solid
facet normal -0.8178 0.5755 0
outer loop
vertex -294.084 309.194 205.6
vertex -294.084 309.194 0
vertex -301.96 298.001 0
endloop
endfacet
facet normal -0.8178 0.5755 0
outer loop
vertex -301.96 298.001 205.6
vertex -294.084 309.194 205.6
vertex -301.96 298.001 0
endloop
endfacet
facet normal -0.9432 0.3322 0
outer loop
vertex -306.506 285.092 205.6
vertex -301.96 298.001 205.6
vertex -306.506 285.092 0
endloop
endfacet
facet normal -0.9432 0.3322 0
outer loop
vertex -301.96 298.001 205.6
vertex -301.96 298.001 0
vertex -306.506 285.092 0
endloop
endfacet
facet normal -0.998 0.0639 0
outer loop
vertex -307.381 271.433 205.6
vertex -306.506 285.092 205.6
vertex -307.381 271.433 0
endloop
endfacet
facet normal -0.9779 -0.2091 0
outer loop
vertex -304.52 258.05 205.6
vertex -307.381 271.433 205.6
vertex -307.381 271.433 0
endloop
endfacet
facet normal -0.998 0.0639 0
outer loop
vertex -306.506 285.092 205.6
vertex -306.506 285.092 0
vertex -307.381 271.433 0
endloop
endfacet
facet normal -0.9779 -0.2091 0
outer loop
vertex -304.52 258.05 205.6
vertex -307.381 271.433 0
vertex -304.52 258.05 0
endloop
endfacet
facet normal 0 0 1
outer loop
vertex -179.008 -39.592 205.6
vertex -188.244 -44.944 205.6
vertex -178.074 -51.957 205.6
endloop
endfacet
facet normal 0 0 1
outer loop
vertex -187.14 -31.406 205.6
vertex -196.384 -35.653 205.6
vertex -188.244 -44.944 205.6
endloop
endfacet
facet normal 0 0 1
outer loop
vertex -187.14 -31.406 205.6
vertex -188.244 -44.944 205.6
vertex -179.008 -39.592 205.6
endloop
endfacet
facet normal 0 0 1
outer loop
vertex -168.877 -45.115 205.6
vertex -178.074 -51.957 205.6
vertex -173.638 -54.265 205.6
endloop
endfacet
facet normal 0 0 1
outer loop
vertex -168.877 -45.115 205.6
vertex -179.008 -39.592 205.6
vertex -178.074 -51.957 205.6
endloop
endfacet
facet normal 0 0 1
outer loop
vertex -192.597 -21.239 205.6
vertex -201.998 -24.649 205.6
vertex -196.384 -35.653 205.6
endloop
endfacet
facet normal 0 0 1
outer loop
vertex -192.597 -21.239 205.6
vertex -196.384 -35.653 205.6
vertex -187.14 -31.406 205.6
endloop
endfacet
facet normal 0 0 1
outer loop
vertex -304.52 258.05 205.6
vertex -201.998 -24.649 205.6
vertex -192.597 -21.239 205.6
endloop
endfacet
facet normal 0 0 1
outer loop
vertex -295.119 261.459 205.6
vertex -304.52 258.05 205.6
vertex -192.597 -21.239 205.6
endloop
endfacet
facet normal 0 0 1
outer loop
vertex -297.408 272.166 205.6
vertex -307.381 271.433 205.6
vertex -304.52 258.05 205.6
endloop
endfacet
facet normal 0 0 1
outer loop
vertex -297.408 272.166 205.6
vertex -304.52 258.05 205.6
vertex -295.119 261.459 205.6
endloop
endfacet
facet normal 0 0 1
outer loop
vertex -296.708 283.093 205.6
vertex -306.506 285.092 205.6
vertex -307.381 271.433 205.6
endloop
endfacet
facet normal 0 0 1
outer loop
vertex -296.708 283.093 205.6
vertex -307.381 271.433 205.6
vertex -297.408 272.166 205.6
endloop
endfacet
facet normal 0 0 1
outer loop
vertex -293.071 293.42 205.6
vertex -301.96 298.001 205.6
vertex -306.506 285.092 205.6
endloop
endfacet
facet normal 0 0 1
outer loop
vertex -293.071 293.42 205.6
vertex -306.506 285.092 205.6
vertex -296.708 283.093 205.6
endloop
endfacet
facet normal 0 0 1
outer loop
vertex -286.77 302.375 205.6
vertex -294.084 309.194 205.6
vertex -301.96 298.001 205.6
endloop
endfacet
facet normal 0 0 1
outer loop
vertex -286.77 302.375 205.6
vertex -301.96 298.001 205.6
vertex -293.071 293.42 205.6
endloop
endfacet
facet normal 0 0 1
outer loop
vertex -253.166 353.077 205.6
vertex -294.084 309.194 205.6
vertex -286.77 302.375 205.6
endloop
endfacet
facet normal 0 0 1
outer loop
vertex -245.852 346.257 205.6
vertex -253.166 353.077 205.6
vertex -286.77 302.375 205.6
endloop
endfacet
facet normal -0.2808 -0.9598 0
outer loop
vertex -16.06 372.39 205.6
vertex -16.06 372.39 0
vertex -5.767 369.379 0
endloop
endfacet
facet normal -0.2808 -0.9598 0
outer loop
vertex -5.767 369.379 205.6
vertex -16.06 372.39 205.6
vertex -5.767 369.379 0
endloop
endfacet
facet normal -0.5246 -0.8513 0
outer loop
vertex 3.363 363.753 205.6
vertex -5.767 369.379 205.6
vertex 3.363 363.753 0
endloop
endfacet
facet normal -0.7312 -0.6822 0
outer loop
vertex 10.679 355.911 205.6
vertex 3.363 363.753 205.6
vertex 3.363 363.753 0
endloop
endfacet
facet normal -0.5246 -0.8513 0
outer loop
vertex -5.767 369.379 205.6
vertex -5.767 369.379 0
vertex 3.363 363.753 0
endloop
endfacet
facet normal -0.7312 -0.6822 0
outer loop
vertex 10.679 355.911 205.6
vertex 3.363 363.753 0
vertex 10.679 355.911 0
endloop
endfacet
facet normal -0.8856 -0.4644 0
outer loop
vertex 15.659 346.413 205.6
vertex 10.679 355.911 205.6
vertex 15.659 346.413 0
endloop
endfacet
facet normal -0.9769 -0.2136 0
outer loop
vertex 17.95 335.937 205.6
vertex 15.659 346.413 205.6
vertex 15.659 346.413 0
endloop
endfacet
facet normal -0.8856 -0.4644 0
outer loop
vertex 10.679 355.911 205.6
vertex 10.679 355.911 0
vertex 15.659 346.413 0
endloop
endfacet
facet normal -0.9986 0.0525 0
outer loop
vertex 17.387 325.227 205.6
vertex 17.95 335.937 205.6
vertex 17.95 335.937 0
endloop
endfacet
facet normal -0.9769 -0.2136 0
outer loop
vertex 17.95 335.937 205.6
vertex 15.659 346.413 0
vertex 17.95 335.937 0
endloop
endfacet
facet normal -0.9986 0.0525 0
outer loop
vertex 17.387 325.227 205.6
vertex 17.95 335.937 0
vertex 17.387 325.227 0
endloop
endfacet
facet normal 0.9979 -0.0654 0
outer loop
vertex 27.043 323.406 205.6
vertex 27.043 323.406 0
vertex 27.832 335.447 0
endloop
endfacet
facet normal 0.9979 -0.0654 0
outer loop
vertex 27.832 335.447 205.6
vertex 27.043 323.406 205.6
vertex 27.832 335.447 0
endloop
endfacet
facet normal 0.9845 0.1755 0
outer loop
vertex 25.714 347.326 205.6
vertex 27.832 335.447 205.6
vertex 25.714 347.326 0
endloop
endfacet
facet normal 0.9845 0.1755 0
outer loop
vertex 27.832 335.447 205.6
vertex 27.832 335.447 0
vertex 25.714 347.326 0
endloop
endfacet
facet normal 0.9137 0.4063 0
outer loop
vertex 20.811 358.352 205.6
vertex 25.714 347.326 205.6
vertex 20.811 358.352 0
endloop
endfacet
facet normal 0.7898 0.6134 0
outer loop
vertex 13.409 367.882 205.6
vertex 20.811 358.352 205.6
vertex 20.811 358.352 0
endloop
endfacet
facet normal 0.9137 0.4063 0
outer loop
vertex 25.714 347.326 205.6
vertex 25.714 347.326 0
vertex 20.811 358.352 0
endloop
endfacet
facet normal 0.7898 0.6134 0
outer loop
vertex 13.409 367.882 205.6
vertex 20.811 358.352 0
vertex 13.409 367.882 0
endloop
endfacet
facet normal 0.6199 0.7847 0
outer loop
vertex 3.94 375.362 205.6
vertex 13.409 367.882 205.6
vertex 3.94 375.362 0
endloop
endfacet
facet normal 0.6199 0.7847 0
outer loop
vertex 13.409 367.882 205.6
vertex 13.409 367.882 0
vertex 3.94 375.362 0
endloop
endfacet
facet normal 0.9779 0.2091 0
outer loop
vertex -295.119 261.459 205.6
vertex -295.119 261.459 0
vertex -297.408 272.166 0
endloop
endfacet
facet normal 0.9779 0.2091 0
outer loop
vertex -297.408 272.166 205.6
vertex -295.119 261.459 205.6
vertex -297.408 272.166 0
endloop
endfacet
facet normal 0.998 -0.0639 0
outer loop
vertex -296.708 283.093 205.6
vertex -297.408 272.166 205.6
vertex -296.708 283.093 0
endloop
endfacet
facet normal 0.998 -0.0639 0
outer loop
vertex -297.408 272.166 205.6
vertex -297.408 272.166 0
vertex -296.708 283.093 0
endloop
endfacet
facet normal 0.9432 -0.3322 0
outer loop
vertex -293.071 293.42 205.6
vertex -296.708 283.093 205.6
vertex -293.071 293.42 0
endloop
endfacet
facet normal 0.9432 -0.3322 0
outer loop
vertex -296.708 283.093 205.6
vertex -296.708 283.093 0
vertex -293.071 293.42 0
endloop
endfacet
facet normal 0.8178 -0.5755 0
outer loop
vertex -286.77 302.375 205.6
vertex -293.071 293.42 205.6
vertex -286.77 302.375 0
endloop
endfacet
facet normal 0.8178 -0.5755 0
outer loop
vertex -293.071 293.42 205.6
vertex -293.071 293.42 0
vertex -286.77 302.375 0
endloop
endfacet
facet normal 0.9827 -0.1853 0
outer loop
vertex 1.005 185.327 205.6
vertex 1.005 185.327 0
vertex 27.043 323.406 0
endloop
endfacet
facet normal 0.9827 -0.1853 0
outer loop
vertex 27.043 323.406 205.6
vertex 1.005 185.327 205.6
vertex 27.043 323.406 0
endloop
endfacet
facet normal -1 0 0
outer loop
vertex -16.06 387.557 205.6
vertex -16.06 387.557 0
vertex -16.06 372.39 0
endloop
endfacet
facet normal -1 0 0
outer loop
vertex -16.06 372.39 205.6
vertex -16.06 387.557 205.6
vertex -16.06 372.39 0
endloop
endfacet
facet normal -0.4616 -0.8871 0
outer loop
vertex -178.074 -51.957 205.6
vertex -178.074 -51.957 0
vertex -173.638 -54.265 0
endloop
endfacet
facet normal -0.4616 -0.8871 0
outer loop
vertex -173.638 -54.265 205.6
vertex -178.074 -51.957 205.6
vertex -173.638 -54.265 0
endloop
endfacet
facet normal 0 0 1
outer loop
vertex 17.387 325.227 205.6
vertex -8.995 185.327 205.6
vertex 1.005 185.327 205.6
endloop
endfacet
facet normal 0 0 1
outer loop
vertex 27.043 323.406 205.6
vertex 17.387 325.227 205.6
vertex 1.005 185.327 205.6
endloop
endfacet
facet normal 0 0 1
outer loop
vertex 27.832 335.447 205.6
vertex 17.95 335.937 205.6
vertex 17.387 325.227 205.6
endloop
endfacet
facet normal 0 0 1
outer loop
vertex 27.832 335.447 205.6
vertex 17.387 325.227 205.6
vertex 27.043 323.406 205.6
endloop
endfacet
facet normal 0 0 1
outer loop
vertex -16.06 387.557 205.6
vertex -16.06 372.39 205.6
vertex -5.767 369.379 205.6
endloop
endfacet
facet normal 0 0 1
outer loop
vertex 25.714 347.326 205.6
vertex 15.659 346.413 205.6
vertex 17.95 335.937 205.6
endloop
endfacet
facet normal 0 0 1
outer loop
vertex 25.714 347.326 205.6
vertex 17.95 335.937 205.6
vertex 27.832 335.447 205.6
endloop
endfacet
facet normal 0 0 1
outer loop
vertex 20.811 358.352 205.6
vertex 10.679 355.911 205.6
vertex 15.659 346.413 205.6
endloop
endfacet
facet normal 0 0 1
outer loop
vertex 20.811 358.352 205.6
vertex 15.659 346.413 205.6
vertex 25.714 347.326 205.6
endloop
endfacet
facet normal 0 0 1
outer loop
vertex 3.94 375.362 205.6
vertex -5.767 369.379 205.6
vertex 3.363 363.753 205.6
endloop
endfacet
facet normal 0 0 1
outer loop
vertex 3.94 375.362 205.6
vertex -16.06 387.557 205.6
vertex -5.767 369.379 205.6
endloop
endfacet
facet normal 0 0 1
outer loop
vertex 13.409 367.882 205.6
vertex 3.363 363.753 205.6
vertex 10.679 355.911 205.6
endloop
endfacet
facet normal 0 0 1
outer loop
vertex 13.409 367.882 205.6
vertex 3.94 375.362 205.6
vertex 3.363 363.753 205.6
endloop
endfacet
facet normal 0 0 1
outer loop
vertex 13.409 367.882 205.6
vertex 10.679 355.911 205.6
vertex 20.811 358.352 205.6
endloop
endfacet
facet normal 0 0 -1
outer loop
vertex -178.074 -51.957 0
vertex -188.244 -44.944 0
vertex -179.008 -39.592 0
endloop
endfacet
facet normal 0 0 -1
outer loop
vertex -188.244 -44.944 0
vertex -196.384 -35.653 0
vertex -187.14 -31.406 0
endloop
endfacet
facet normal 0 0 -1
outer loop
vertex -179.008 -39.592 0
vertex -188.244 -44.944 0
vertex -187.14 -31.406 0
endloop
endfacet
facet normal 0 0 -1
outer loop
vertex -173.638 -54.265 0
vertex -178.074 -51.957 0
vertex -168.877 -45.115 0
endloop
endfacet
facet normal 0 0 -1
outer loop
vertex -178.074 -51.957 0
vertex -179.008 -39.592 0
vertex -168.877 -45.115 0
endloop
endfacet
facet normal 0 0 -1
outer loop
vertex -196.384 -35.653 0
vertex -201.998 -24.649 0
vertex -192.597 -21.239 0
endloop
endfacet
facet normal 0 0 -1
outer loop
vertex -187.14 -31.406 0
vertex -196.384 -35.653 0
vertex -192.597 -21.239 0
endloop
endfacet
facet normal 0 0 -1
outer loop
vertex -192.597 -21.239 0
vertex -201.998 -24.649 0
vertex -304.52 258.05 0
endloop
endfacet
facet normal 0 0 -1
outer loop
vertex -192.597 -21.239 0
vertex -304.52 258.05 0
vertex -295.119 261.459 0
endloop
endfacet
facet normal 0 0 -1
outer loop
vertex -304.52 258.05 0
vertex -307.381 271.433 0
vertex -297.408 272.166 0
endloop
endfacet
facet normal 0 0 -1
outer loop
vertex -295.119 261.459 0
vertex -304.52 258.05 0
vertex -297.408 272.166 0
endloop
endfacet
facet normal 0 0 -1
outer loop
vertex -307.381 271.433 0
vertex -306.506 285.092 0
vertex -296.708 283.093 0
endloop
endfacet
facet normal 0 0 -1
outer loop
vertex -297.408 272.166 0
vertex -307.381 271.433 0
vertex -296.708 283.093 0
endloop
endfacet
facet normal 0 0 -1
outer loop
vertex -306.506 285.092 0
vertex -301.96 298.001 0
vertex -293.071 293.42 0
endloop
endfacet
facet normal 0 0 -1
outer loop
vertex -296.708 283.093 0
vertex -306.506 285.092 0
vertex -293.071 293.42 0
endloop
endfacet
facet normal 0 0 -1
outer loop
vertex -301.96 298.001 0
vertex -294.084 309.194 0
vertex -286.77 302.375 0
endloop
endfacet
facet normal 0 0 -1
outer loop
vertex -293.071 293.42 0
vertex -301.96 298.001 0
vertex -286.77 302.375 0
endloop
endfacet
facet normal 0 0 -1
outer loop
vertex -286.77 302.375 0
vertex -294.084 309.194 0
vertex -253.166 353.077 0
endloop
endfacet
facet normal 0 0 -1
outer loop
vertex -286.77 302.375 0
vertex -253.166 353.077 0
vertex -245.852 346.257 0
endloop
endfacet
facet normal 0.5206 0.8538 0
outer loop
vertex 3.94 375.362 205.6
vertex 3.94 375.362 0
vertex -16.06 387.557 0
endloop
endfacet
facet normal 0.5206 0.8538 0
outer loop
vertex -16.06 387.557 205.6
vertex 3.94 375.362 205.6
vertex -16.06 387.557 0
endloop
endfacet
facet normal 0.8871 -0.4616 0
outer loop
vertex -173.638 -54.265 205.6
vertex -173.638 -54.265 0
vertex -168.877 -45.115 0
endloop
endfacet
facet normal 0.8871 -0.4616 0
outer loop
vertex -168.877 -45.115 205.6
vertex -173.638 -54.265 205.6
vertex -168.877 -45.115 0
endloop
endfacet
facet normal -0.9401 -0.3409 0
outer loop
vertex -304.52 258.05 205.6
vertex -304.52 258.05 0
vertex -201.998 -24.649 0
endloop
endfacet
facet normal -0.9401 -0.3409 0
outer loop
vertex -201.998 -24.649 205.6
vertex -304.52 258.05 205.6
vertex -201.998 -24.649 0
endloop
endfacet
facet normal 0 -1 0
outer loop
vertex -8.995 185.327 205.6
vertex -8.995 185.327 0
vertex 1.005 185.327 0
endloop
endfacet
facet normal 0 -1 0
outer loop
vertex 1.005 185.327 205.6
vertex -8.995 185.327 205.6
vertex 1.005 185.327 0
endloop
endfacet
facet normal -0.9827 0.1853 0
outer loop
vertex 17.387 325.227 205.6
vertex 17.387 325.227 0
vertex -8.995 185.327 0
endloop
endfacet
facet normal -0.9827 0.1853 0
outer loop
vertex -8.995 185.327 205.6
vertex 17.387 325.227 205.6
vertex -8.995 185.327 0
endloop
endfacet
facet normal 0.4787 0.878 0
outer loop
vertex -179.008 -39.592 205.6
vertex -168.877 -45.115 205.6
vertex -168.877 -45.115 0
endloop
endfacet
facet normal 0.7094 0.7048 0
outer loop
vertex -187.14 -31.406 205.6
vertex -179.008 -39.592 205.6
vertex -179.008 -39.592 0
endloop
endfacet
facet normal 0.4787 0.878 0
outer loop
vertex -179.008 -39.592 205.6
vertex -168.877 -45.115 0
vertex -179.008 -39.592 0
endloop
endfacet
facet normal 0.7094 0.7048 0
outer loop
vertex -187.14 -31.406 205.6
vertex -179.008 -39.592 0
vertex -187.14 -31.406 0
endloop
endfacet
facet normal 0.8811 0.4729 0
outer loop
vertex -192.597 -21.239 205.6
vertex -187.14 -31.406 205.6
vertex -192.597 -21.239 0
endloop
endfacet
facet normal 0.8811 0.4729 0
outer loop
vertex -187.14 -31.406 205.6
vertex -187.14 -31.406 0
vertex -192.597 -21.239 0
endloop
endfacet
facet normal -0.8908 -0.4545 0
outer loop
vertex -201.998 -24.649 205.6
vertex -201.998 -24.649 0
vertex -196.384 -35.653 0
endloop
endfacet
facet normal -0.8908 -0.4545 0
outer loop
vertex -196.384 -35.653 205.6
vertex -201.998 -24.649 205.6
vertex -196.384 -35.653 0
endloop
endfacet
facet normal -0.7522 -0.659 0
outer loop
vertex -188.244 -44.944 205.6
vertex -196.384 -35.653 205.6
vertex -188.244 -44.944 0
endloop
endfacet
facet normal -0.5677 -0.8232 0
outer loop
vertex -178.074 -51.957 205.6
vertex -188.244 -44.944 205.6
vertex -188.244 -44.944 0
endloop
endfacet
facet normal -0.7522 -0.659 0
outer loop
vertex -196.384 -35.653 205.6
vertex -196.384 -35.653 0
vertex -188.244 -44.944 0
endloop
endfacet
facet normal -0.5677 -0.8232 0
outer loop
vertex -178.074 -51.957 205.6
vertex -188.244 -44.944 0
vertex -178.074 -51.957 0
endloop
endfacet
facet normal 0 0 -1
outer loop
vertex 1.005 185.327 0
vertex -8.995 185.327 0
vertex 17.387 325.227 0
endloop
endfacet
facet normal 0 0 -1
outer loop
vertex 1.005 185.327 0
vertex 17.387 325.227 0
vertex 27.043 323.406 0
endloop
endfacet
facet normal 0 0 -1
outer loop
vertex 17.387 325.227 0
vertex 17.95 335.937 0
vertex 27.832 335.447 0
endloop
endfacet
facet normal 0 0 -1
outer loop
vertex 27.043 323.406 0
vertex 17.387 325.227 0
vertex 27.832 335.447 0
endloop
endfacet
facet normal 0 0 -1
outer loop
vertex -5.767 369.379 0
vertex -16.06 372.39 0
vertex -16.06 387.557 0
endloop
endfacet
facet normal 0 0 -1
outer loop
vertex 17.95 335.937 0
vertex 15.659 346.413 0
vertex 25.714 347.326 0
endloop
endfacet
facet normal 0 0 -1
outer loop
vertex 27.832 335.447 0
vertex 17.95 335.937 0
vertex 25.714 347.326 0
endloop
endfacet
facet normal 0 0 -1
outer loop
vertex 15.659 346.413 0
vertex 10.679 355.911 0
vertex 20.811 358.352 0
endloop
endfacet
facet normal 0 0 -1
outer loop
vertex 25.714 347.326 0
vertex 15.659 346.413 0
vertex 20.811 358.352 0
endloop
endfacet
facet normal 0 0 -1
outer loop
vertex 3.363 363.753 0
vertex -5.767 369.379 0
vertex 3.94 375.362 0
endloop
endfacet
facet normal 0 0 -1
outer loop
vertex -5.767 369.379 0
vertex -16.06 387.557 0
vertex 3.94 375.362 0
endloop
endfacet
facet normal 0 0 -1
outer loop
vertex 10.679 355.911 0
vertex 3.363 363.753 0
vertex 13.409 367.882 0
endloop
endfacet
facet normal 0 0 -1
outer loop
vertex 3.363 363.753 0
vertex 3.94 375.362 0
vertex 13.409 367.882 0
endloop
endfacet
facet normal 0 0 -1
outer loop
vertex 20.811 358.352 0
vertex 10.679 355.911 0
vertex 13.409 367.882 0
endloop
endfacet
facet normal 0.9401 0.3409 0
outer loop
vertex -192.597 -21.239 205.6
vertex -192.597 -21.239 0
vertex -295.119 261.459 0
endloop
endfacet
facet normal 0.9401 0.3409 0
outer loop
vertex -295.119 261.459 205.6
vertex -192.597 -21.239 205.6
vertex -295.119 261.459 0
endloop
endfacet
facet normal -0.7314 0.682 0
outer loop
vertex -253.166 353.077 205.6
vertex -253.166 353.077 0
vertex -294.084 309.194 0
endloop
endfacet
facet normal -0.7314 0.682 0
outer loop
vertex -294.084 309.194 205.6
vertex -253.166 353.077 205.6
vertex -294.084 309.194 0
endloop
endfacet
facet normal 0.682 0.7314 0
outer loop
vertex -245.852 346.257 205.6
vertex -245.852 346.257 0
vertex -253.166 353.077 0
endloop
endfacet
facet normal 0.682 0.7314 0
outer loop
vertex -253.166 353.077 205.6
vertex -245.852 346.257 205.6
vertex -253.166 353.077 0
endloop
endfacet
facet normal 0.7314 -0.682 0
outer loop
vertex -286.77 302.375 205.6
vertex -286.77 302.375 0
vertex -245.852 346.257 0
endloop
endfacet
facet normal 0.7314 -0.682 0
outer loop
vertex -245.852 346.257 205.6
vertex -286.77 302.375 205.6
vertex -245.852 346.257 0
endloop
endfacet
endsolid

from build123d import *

# Parameters (mm, degrees)
EXTRUDE_1_DEPTH   = 205.6
EXTRUDE_1_2_DEPTH = 205.6


with BuildPart() as part:
    # 草图1 → 凸台-拉伸1 (new body)
    with BuildSketch(Plane.XY):
        with BuildLine():
            Line((-8.995494076, 185.326700571), (1.004505924, 185.326700571))
            Line((1.004505924, 185.326700571), (27.04342469, 323.406049026))
            ThreePointArc((27.04342469, 323.406049026), (23.5960153, 352.98764851), (3.939822245, 375.361511256))
            Line((3.939822245, 375.361511256), (-16.060177755, 387.55663496))
            Line((-16.060177755, 387.55663496), (-16.060177755, 372.389722306))
            ThreePointArc((-16.060177755, 372.389722306), (10.678605878, 355.911082125), (17.386834148, 325.227082942))
            Line((17.386834148, 325.227082942), (-8.995494076, 185.326700571))
        make_face()
    extrude(amount=EXTRUDE_1_DEPTH)


with BuildPart() as body_2:
    # 草图1 → Extrude 1 2 (new body)
    with BuildSketch(Plane.XY):
        with BuildLine():
            Line((-173.638339805, -54.26465335), (-168.877472349, -45.115490849))
            ThreePointArc((-168.877472349, -45.115490849), (-183.370602204, -35.793508136), (-192.597121359, -21.239418711))
            Line((-192.597121359, -21.239418711), (-295.118607687, 261.458792952))
            ThreePointArc((-295.118607687, 261.458792952), (-296.707501188, 283.092676983), (-286.770141016, 302.374751396))
            Line((-286.770141016, 302.374751396), (-245.851813515, 346.257441315))
            Line((-245.851813515, 346.257441315), (-253.165595168, 353.077162565))
            Line((-253.165595168, 353.077162565), (-294.083922669, 309.194472646))
            ThreePointArc((-294.083922669, 309.194472646), (-306.505622885, 285.09187963), (-304.519506008, 258.049524591))
            Line((-304.519506008, 258.049524591), (-201.99801968, -24.648687072))
            ThreePointArc((-201.99801968, -24.648687072), (-192.602015595, -40.550815133), (-178.073768212, -51.956629336))
            Line((-178.073768212, -51.956629336), (-173.638339805, -54.26465335))
        make_face()
    extrude(amount=EXTRUDE_1_2_DEPTH)


solid = Compound([part.part, body_2.part])
